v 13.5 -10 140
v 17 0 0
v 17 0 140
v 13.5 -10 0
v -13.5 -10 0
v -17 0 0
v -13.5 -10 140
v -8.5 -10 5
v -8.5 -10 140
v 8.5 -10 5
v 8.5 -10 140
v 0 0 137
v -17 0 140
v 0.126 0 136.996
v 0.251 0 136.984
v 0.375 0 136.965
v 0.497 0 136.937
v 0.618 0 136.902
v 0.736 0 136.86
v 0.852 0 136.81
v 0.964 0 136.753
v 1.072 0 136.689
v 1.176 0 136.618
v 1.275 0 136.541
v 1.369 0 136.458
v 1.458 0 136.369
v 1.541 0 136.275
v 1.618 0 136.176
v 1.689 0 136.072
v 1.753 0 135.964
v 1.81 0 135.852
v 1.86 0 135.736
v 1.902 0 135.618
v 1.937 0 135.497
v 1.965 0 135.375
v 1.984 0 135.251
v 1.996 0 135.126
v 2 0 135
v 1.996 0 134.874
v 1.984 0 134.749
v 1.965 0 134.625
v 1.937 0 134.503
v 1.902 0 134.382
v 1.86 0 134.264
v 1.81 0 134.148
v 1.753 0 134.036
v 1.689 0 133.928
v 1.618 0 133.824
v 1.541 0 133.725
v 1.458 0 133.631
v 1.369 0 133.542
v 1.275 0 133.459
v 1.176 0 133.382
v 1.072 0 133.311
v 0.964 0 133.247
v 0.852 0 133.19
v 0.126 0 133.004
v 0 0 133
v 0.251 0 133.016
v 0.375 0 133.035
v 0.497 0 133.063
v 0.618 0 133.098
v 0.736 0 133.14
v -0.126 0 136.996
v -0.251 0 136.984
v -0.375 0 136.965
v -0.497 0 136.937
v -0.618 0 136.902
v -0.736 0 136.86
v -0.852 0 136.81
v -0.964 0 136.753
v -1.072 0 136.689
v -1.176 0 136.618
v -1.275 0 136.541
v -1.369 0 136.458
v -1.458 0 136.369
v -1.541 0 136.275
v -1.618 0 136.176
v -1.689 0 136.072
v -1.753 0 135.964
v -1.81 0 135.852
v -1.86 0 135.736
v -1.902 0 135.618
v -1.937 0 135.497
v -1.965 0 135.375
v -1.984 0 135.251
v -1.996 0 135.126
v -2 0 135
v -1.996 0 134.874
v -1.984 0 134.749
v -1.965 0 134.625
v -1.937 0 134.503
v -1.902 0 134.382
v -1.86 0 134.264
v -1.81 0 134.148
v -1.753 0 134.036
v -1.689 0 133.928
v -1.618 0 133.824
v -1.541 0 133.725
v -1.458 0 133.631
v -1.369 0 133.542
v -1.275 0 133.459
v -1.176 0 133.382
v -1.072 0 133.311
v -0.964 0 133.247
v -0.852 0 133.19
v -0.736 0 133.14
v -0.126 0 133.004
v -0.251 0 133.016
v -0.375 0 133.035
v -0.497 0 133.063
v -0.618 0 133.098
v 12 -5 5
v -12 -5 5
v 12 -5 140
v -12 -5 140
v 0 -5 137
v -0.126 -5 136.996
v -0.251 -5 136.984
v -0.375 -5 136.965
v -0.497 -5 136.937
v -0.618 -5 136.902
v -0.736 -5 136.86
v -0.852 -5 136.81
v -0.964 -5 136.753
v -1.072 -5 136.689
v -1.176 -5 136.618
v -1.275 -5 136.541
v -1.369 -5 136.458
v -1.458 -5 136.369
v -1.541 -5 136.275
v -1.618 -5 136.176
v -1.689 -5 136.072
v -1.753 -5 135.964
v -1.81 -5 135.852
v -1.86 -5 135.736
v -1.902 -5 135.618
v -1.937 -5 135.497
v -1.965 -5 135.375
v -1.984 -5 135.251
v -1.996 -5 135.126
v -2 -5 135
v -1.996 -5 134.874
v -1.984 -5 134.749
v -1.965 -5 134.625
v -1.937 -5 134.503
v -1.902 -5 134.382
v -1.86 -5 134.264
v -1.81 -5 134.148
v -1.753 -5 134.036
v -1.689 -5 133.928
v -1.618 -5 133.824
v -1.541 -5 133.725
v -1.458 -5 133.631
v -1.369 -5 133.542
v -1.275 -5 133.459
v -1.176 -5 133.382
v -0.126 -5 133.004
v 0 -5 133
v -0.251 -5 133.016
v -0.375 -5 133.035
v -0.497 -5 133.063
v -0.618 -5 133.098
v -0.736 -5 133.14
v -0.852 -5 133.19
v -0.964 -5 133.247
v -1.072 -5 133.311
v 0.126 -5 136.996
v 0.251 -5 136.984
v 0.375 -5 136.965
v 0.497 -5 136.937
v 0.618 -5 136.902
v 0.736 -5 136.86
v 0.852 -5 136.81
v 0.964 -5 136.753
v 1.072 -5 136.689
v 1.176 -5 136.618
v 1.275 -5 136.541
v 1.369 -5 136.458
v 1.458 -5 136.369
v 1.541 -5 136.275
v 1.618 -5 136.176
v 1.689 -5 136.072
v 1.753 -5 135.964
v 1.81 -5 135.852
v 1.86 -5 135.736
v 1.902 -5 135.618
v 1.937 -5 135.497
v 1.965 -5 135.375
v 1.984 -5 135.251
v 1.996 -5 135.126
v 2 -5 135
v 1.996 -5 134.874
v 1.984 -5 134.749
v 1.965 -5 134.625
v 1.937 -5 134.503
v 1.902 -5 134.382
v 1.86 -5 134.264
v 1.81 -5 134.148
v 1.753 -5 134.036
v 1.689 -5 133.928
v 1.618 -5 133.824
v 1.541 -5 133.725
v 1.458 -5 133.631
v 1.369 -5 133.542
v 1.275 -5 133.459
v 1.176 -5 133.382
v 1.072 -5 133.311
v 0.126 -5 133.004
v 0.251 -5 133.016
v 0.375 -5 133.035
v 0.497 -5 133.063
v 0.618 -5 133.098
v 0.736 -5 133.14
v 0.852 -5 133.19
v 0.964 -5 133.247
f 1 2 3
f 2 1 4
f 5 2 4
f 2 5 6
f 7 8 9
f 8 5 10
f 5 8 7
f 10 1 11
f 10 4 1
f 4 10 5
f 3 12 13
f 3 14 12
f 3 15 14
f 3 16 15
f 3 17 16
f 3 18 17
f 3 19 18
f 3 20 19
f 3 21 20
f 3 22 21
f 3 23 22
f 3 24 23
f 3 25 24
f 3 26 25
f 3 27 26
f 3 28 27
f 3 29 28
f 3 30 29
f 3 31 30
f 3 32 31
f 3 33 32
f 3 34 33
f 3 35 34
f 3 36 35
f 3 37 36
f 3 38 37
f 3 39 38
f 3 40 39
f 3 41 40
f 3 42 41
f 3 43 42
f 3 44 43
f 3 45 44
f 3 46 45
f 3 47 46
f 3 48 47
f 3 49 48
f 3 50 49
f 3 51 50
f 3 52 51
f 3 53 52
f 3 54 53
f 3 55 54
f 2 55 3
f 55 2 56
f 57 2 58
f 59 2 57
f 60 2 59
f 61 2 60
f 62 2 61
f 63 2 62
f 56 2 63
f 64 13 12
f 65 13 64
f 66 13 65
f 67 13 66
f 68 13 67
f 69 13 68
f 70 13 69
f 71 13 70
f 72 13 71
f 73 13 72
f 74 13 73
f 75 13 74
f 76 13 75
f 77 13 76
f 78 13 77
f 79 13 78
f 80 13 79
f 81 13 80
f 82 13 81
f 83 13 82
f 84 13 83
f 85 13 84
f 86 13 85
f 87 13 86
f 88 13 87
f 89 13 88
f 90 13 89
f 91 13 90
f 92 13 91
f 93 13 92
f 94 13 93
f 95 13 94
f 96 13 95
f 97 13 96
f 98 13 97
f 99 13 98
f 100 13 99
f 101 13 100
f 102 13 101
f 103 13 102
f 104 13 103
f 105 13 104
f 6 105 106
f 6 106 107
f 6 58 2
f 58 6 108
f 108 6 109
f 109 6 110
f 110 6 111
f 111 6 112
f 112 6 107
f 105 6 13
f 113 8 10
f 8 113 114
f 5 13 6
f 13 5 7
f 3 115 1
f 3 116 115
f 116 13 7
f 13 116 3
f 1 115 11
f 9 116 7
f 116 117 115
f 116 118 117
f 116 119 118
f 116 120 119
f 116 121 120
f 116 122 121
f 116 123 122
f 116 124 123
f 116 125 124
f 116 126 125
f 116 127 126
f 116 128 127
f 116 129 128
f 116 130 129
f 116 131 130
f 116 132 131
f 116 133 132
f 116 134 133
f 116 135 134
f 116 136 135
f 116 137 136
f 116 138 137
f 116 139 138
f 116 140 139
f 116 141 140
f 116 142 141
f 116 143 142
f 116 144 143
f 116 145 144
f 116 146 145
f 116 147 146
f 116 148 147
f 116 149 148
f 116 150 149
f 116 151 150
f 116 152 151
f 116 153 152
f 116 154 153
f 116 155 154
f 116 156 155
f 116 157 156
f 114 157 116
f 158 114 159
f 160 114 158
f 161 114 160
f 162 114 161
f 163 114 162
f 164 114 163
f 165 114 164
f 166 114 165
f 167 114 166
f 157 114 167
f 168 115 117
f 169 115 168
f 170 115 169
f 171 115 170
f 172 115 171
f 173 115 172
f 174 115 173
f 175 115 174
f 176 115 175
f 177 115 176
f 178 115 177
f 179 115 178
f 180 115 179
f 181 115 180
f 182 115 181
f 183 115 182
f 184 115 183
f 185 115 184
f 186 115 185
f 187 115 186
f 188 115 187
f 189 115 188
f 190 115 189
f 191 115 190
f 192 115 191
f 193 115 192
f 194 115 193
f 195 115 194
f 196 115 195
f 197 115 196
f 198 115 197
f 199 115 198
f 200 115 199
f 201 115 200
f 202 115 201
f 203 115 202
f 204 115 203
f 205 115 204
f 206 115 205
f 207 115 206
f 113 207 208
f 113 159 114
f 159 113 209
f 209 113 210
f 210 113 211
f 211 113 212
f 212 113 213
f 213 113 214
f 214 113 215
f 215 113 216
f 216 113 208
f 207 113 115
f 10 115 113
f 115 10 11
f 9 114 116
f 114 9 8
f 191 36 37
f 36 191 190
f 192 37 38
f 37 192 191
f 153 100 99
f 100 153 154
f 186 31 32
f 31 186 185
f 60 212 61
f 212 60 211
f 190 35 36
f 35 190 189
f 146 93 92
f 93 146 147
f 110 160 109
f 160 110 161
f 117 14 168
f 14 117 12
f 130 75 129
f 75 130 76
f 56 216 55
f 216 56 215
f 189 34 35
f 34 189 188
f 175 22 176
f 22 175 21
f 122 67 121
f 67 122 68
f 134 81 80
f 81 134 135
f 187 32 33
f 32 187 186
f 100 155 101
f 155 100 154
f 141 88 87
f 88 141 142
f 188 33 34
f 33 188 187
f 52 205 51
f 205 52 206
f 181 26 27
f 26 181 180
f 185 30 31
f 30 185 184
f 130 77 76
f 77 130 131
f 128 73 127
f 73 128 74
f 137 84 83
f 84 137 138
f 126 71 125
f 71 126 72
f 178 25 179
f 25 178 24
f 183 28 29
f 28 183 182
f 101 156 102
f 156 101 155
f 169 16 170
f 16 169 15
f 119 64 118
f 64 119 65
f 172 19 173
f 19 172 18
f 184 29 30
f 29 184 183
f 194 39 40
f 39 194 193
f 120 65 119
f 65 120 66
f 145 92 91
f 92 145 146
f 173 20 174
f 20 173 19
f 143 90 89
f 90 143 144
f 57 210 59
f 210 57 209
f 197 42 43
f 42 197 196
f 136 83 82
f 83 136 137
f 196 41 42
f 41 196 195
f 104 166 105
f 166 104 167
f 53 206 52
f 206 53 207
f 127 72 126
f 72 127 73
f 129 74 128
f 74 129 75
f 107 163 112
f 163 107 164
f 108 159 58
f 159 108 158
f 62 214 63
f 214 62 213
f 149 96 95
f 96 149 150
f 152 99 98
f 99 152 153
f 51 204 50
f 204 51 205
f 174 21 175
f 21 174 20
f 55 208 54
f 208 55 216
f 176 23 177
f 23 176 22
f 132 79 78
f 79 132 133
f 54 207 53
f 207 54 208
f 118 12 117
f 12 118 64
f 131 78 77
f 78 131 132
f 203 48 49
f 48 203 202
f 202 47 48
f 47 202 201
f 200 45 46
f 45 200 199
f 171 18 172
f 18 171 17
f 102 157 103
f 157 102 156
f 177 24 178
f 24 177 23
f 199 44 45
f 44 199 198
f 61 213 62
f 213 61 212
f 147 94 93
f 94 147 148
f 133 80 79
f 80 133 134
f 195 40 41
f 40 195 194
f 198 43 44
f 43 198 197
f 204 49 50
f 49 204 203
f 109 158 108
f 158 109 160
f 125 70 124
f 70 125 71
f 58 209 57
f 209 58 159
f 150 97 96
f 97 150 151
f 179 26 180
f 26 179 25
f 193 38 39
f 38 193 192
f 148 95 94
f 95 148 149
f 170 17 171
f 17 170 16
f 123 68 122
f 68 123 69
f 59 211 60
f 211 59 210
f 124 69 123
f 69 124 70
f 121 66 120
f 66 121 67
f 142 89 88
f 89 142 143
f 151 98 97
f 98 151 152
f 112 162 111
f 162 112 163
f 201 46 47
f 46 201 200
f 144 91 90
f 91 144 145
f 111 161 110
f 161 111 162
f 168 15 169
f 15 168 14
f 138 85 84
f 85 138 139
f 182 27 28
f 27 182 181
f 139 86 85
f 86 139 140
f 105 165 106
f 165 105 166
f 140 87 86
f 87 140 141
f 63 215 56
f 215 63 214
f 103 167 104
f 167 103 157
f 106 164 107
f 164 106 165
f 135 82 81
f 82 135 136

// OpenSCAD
$fn = 100;

module glissiere() {

	l = 125;
	b1 = 8.5;
	b2 = 12;
	h = 5;
	ep= 5;
	profile_glissiere = [[-b1, -h-ep], [-b1-ep, -h-ep], [-b2-ep, 0], [b2+ep, 0], [b1+ep, -h-ep], [b1, -h-ep], [b2, -ep], [-b2, -ep]];
	profile_glissiere_e = [[-b1-ep, -h-ep], [-b2-ep, 0], [b2+ep, 0], [b1+ep, -h-ep]];

	difference() {
		union() {
			linear_extrude(ep) polygon(profile_glissiere_e);
			translate([0,0,ep]) linear_extrude(l + 10)
			    polygon(profile_glissiere);
		};
		translate([0,0,ep + l + 5]) rotate([90, 0, 0]) cylinder(h = ep, d = 4, center=false);
	}
}

glissiere();
